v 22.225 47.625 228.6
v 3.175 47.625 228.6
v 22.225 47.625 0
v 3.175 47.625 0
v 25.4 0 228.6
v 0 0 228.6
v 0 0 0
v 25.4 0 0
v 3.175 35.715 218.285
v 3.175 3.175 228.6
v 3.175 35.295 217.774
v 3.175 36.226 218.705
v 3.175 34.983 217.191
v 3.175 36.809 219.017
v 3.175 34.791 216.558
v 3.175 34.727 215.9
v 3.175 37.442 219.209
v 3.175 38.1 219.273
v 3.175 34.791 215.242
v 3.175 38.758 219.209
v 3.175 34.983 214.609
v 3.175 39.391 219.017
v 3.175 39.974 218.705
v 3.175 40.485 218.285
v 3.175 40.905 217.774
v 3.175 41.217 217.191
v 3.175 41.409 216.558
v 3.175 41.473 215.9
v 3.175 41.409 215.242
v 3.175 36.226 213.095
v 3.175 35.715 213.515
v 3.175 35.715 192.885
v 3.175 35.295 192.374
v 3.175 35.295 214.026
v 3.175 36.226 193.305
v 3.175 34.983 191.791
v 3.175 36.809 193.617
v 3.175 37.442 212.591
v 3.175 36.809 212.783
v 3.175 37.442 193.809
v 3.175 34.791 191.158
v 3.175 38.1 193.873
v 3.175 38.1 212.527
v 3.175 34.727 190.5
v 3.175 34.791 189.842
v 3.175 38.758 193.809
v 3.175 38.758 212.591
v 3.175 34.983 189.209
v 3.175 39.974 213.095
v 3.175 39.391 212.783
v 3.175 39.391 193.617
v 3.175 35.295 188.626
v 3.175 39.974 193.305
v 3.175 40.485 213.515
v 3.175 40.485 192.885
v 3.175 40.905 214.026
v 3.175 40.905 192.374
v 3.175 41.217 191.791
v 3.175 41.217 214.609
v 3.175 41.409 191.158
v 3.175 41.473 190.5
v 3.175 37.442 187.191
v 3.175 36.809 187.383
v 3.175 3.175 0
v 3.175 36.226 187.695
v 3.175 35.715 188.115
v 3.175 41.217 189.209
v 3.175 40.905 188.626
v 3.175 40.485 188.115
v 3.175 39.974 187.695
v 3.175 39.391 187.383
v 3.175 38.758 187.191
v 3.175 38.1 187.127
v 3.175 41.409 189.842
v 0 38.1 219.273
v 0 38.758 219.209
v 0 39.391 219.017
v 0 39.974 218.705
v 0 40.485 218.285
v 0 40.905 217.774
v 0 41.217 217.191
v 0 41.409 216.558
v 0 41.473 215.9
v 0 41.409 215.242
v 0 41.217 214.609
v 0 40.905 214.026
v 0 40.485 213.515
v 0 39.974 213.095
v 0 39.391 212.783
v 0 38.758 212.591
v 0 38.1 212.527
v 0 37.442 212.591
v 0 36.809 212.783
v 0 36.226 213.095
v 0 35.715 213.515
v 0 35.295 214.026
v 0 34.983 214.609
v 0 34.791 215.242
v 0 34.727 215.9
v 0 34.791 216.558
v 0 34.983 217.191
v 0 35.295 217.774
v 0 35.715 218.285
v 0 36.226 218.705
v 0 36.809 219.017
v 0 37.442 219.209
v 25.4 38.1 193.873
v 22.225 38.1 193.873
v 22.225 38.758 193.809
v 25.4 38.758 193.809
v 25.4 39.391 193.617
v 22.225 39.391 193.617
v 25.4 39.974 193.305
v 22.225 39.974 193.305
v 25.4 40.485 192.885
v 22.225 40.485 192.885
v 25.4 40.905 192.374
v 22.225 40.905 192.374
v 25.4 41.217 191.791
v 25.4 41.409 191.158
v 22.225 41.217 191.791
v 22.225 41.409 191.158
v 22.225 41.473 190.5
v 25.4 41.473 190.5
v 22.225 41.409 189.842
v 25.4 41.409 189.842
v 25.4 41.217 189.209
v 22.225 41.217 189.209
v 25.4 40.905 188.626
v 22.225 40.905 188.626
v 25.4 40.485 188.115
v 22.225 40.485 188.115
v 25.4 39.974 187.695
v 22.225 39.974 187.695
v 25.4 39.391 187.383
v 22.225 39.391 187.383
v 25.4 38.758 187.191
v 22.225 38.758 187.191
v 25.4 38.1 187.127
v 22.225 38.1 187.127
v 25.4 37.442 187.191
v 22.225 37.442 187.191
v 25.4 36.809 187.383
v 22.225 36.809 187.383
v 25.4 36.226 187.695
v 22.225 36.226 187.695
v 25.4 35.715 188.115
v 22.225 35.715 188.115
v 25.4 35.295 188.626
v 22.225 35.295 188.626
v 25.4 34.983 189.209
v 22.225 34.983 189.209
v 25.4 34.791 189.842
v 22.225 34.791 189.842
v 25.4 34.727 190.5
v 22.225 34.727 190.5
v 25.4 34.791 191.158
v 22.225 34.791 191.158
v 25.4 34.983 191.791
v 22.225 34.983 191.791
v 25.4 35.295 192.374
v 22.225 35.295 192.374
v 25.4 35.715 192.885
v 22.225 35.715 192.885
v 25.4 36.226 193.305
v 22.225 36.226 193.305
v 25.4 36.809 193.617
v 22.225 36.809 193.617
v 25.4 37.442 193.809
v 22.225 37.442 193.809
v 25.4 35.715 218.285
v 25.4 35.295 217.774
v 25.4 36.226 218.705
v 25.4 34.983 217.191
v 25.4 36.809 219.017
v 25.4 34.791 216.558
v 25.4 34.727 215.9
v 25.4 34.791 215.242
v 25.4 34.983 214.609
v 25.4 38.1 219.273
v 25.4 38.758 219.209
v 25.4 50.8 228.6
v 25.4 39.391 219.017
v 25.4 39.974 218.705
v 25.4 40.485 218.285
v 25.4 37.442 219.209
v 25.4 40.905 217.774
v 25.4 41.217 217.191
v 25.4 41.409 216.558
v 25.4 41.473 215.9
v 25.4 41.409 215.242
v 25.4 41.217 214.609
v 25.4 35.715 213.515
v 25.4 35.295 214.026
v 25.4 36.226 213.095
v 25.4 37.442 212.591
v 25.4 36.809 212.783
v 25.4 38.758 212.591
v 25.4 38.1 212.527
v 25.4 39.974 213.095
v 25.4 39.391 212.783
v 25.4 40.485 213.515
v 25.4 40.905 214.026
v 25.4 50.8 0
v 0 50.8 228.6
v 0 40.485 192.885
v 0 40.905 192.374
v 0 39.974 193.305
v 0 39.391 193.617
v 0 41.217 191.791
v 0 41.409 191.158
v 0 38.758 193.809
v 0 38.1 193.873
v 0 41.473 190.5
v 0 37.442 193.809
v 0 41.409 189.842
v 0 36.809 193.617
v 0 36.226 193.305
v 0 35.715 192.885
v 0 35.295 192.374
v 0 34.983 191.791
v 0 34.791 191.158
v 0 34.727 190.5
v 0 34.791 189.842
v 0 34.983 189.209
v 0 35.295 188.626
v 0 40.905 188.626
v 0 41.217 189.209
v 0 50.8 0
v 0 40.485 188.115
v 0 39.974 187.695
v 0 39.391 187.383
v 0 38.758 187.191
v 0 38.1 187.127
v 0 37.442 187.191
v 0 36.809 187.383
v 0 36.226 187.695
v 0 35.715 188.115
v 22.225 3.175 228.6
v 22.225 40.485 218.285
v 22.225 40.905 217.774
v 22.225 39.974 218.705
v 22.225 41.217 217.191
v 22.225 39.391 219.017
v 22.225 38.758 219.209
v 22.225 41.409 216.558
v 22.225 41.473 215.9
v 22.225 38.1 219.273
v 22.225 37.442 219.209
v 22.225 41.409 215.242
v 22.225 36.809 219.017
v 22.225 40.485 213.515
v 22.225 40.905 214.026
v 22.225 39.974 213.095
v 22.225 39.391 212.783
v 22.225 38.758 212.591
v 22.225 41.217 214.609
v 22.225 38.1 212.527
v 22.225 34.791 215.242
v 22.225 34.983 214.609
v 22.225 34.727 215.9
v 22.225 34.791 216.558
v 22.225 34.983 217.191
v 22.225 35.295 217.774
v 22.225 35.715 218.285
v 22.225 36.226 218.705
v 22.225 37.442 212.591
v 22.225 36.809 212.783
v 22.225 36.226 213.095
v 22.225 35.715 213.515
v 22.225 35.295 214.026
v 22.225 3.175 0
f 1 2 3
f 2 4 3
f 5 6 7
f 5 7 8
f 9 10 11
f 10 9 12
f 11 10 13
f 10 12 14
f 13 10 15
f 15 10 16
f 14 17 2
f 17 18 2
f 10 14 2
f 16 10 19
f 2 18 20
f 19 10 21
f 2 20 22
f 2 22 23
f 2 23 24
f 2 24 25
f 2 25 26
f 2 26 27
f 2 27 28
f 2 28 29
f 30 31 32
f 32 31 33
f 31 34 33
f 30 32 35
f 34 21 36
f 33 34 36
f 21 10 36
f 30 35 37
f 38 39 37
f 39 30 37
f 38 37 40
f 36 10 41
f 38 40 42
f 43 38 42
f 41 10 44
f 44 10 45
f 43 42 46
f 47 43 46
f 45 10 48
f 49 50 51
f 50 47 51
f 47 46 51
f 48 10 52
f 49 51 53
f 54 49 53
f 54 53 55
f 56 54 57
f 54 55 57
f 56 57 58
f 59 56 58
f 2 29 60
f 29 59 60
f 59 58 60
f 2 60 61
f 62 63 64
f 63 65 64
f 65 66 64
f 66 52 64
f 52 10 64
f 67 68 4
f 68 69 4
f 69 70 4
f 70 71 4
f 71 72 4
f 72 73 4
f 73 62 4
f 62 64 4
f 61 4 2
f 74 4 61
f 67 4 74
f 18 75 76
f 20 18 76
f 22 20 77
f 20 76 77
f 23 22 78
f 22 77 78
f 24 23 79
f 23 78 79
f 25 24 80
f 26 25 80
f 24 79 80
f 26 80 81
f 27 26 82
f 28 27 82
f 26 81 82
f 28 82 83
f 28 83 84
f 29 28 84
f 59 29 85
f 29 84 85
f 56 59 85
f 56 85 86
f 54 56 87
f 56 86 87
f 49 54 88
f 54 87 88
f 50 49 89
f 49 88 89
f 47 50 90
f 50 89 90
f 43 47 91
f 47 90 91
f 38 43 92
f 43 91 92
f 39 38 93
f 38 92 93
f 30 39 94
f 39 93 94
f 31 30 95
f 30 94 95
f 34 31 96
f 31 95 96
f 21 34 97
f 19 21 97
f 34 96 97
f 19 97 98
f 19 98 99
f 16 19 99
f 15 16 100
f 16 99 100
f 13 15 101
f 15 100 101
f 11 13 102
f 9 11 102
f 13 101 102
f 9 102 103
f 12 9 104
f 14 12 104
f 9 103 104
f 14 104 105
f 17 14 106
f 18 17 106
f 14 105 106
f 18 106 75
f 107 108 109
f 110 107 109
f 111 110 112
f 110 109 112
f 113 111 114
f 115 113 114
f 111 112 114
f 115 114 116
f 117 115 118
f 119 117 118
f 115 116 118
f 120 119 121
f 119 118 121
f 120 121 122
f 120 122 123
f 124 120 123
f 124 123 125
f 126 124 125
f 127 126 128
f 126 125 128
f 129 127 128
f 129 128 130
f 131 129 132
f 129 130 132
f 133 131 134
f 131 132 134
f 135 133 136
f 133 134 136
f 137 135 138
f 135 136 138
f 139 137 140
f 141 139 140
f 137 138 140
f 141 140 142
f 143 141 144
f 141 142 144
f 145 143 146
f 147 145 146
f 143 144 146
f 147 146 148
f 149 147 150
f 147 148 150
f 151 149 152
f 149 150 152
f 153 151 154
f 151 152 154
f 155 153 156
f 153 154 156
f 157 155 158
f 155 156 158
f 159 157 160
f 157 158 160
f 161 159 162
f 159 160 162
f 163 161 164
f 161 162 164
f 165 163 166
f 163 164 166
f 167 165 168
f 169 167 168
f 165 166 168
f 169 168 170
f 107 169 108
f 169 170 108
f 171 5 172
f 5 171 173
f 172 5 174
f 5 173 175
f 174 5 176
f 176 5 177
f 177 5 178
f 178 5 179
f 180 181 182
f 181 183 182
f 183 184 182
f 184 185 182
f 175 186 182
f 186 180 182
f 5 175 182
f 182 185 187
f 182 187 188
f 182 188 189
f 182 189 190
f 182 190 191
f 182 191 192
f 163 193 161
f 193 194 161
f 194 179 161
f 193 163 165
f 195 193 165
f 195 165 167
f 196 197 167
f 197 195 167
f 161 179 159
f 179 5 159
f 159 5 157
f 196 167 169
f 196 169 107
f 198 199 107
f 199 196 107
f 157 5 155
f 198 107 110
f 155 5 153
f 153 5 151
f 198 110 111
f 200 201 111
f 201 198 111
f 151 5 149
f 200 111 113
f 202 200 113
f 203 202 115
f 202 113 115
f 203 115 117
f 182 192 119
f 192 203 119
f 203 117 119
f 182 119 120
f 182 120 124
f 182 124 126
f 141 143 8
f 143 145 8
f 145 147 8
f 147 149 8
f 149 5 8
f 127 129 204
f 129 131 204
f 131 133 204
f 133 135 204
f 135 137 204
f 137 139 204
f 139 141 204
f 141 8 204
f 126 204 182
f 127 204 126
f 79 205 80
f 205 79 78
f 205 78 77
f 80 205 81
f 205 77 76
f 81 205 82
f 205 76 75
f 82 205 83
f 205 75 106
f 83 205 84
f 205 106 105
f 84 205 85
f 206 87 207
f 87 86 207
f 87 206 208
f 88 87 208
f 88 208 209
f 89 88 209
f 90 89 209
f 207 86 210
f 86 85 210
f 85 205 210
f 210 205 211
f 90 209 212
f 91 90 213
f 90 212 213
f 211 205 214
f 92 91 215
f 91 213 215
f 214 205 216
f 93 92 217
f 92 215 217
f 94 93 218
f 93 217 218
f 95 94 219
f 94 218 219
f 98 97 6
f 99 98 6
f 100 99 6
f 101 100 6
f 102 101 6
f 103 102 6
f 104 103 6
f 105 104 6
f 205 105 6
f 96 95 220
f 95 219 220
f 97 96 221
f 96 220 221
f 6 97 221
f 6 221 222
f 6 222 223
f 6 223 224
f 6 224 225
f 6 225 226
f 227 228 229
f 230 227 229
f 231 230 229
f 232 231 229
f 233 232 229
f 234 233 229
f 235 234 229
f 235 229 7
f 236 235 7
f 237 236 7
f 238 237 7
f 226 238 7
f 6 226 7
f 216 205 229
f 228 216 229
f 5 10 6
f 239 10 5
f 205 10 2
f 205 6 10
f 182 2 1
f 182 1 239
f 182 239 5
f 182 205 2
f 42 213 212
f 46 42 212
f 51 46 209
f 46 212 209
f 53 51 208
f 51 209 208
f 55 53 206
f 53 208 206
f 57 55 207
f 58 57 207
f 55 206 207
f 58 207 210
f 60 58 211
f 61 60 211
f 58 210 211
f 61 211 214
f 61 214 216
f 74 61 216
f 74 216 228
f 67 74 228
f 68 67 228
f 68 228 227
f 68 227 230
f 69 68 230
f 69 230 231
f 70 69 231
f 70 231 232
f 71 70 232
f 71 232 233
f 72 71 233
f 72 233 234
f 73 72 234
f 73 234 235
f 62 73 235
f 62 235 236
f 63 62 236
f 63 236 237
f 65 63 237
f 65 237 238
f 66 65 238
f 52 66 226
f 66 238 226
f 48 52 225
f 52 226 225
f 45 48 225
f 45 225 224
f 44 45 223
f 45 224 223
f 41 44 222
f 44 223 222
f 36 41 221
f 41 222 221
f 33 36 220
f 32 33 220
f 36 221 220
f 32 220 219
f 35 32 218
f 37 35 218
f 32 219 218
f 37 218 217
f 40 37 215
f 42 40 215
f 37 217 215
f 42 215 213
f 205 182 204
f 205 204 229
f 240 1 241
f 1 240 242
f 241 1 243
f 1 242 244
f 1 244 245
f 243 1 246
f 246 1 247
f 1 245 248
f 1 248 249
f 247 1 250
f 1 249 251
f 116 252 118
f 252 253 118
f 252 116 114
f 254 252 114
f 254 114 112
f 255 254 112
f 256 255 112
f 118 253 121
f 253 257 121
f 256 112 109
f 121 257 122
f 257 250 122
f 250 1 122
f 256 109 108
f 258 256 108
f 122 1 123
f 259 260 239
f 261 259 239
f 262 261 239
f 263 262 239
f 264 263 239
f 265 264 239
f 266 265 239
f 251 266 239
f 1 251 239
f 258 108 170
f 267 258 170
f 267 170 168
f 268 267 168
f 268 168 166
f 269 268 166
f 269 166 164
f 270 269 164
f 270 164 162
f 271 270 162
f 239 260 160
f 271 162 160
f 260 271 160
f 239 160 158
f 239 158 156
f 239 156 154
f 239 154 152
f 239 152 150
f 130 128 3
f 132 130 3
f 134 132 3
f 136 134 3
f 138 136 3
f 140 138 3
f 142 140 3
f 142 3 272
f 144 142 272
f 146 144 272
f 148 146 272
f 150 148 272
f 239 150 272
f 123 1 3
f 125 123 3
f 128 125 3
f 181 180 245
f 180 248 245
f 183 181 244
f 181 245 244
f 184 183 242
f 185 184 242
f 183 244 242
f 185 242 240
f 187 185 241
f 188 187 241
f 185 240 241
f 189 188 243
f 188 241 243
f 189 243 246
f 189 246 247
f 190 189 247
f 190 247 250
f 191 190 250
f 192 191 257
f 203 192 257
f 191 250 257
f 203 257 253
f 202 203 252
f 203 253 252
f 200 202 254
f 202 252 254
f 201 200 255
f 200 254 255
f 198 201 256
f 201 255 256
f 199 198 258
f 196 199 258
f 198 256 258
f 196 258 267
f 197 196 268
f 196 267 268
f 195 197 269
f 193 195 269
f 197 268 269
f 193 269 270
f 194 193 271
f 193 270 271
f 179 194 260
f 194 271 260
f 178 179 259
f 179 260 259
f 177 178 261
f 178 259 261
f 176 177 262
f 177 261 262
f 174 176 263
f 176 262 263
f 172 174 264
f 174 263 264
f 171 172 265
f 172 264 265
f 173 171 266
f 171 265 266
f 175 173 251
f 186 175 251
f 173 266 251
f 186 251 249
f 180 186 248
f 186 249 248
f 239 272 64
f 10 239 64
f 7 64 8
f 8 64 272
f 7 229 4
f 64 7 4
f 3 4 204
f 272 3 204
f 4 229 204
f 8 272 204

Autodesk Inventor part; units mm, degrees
ref_plane "YZ Plane" through (0, 0, 0) normal (1, 0, 0) x (0, 1, 0)
ref_plane "XZ Plane" through (0, 0, 0) normal (0, 1, 0) x (-1, 0, 0)
ref_plane "XY Plane" through (0, 0, 0) normal (0, 0, 1) x (1, 0, 0)
sketch "Sketch1" plane through (0, 0, 0) normal (0, 0, 1) x (1, 0, 0)
  line L0 (0, 0) -> (25.4, 0)
  line L1 (25.4, 0) -> (25.4, 50.8)
  line L2 (25.4, 50.8) -> (0, 50.8)
  line L3 (0, 50.8) -> (0, 0)
  line L4 (22.225, 3.175) -> (3.175, 3.175)
  line L5 (3.175, 3.175) -> (3.175, 47.625)
  line L6 (3.175, 47.625) -> (22.225, 47.625)
  line L7 (22.225, 47.625) -> (22.225, 3.175)
  dimension "d0" = 25.4
  dimension "d1" = 50.8
  dimension "d2" = 3.175
  dimension "d3" = 3.175
  dimension "d4" = 3.175
  dimension "d5" = 3.175
extrude "Extrusion1" add sketch "Sketch1" along normal blind 228.6
sketch "Sketch2" plane through (0, 0, 0) normal (-1, 0, 0) x (0, 0, 1)
  circle A0 centre (215.9, 38.1) radius 3.3734
  circle A1 centre (190.5, 38.1) radius 3.3734
  line L0 (0, 50.8) -> (228.6, 50.8) projected
  line L1 (228.6, 50.8) -> (228.6, 0) projected
  point P0 (0, 0)
  dimension "d8" = 6.7469
  dimension "d9" = 6.7469
  dimension "d10" = 12.7
  dimension "d11" = 12.7
  dimension "d12" = 12.7
  dimension "d13" = 38.1
extrude "Extrusion2" cut sketch "Sketch2" against normal blind 25.4
properties part number "superstructure" material "Aluminum 6061"
